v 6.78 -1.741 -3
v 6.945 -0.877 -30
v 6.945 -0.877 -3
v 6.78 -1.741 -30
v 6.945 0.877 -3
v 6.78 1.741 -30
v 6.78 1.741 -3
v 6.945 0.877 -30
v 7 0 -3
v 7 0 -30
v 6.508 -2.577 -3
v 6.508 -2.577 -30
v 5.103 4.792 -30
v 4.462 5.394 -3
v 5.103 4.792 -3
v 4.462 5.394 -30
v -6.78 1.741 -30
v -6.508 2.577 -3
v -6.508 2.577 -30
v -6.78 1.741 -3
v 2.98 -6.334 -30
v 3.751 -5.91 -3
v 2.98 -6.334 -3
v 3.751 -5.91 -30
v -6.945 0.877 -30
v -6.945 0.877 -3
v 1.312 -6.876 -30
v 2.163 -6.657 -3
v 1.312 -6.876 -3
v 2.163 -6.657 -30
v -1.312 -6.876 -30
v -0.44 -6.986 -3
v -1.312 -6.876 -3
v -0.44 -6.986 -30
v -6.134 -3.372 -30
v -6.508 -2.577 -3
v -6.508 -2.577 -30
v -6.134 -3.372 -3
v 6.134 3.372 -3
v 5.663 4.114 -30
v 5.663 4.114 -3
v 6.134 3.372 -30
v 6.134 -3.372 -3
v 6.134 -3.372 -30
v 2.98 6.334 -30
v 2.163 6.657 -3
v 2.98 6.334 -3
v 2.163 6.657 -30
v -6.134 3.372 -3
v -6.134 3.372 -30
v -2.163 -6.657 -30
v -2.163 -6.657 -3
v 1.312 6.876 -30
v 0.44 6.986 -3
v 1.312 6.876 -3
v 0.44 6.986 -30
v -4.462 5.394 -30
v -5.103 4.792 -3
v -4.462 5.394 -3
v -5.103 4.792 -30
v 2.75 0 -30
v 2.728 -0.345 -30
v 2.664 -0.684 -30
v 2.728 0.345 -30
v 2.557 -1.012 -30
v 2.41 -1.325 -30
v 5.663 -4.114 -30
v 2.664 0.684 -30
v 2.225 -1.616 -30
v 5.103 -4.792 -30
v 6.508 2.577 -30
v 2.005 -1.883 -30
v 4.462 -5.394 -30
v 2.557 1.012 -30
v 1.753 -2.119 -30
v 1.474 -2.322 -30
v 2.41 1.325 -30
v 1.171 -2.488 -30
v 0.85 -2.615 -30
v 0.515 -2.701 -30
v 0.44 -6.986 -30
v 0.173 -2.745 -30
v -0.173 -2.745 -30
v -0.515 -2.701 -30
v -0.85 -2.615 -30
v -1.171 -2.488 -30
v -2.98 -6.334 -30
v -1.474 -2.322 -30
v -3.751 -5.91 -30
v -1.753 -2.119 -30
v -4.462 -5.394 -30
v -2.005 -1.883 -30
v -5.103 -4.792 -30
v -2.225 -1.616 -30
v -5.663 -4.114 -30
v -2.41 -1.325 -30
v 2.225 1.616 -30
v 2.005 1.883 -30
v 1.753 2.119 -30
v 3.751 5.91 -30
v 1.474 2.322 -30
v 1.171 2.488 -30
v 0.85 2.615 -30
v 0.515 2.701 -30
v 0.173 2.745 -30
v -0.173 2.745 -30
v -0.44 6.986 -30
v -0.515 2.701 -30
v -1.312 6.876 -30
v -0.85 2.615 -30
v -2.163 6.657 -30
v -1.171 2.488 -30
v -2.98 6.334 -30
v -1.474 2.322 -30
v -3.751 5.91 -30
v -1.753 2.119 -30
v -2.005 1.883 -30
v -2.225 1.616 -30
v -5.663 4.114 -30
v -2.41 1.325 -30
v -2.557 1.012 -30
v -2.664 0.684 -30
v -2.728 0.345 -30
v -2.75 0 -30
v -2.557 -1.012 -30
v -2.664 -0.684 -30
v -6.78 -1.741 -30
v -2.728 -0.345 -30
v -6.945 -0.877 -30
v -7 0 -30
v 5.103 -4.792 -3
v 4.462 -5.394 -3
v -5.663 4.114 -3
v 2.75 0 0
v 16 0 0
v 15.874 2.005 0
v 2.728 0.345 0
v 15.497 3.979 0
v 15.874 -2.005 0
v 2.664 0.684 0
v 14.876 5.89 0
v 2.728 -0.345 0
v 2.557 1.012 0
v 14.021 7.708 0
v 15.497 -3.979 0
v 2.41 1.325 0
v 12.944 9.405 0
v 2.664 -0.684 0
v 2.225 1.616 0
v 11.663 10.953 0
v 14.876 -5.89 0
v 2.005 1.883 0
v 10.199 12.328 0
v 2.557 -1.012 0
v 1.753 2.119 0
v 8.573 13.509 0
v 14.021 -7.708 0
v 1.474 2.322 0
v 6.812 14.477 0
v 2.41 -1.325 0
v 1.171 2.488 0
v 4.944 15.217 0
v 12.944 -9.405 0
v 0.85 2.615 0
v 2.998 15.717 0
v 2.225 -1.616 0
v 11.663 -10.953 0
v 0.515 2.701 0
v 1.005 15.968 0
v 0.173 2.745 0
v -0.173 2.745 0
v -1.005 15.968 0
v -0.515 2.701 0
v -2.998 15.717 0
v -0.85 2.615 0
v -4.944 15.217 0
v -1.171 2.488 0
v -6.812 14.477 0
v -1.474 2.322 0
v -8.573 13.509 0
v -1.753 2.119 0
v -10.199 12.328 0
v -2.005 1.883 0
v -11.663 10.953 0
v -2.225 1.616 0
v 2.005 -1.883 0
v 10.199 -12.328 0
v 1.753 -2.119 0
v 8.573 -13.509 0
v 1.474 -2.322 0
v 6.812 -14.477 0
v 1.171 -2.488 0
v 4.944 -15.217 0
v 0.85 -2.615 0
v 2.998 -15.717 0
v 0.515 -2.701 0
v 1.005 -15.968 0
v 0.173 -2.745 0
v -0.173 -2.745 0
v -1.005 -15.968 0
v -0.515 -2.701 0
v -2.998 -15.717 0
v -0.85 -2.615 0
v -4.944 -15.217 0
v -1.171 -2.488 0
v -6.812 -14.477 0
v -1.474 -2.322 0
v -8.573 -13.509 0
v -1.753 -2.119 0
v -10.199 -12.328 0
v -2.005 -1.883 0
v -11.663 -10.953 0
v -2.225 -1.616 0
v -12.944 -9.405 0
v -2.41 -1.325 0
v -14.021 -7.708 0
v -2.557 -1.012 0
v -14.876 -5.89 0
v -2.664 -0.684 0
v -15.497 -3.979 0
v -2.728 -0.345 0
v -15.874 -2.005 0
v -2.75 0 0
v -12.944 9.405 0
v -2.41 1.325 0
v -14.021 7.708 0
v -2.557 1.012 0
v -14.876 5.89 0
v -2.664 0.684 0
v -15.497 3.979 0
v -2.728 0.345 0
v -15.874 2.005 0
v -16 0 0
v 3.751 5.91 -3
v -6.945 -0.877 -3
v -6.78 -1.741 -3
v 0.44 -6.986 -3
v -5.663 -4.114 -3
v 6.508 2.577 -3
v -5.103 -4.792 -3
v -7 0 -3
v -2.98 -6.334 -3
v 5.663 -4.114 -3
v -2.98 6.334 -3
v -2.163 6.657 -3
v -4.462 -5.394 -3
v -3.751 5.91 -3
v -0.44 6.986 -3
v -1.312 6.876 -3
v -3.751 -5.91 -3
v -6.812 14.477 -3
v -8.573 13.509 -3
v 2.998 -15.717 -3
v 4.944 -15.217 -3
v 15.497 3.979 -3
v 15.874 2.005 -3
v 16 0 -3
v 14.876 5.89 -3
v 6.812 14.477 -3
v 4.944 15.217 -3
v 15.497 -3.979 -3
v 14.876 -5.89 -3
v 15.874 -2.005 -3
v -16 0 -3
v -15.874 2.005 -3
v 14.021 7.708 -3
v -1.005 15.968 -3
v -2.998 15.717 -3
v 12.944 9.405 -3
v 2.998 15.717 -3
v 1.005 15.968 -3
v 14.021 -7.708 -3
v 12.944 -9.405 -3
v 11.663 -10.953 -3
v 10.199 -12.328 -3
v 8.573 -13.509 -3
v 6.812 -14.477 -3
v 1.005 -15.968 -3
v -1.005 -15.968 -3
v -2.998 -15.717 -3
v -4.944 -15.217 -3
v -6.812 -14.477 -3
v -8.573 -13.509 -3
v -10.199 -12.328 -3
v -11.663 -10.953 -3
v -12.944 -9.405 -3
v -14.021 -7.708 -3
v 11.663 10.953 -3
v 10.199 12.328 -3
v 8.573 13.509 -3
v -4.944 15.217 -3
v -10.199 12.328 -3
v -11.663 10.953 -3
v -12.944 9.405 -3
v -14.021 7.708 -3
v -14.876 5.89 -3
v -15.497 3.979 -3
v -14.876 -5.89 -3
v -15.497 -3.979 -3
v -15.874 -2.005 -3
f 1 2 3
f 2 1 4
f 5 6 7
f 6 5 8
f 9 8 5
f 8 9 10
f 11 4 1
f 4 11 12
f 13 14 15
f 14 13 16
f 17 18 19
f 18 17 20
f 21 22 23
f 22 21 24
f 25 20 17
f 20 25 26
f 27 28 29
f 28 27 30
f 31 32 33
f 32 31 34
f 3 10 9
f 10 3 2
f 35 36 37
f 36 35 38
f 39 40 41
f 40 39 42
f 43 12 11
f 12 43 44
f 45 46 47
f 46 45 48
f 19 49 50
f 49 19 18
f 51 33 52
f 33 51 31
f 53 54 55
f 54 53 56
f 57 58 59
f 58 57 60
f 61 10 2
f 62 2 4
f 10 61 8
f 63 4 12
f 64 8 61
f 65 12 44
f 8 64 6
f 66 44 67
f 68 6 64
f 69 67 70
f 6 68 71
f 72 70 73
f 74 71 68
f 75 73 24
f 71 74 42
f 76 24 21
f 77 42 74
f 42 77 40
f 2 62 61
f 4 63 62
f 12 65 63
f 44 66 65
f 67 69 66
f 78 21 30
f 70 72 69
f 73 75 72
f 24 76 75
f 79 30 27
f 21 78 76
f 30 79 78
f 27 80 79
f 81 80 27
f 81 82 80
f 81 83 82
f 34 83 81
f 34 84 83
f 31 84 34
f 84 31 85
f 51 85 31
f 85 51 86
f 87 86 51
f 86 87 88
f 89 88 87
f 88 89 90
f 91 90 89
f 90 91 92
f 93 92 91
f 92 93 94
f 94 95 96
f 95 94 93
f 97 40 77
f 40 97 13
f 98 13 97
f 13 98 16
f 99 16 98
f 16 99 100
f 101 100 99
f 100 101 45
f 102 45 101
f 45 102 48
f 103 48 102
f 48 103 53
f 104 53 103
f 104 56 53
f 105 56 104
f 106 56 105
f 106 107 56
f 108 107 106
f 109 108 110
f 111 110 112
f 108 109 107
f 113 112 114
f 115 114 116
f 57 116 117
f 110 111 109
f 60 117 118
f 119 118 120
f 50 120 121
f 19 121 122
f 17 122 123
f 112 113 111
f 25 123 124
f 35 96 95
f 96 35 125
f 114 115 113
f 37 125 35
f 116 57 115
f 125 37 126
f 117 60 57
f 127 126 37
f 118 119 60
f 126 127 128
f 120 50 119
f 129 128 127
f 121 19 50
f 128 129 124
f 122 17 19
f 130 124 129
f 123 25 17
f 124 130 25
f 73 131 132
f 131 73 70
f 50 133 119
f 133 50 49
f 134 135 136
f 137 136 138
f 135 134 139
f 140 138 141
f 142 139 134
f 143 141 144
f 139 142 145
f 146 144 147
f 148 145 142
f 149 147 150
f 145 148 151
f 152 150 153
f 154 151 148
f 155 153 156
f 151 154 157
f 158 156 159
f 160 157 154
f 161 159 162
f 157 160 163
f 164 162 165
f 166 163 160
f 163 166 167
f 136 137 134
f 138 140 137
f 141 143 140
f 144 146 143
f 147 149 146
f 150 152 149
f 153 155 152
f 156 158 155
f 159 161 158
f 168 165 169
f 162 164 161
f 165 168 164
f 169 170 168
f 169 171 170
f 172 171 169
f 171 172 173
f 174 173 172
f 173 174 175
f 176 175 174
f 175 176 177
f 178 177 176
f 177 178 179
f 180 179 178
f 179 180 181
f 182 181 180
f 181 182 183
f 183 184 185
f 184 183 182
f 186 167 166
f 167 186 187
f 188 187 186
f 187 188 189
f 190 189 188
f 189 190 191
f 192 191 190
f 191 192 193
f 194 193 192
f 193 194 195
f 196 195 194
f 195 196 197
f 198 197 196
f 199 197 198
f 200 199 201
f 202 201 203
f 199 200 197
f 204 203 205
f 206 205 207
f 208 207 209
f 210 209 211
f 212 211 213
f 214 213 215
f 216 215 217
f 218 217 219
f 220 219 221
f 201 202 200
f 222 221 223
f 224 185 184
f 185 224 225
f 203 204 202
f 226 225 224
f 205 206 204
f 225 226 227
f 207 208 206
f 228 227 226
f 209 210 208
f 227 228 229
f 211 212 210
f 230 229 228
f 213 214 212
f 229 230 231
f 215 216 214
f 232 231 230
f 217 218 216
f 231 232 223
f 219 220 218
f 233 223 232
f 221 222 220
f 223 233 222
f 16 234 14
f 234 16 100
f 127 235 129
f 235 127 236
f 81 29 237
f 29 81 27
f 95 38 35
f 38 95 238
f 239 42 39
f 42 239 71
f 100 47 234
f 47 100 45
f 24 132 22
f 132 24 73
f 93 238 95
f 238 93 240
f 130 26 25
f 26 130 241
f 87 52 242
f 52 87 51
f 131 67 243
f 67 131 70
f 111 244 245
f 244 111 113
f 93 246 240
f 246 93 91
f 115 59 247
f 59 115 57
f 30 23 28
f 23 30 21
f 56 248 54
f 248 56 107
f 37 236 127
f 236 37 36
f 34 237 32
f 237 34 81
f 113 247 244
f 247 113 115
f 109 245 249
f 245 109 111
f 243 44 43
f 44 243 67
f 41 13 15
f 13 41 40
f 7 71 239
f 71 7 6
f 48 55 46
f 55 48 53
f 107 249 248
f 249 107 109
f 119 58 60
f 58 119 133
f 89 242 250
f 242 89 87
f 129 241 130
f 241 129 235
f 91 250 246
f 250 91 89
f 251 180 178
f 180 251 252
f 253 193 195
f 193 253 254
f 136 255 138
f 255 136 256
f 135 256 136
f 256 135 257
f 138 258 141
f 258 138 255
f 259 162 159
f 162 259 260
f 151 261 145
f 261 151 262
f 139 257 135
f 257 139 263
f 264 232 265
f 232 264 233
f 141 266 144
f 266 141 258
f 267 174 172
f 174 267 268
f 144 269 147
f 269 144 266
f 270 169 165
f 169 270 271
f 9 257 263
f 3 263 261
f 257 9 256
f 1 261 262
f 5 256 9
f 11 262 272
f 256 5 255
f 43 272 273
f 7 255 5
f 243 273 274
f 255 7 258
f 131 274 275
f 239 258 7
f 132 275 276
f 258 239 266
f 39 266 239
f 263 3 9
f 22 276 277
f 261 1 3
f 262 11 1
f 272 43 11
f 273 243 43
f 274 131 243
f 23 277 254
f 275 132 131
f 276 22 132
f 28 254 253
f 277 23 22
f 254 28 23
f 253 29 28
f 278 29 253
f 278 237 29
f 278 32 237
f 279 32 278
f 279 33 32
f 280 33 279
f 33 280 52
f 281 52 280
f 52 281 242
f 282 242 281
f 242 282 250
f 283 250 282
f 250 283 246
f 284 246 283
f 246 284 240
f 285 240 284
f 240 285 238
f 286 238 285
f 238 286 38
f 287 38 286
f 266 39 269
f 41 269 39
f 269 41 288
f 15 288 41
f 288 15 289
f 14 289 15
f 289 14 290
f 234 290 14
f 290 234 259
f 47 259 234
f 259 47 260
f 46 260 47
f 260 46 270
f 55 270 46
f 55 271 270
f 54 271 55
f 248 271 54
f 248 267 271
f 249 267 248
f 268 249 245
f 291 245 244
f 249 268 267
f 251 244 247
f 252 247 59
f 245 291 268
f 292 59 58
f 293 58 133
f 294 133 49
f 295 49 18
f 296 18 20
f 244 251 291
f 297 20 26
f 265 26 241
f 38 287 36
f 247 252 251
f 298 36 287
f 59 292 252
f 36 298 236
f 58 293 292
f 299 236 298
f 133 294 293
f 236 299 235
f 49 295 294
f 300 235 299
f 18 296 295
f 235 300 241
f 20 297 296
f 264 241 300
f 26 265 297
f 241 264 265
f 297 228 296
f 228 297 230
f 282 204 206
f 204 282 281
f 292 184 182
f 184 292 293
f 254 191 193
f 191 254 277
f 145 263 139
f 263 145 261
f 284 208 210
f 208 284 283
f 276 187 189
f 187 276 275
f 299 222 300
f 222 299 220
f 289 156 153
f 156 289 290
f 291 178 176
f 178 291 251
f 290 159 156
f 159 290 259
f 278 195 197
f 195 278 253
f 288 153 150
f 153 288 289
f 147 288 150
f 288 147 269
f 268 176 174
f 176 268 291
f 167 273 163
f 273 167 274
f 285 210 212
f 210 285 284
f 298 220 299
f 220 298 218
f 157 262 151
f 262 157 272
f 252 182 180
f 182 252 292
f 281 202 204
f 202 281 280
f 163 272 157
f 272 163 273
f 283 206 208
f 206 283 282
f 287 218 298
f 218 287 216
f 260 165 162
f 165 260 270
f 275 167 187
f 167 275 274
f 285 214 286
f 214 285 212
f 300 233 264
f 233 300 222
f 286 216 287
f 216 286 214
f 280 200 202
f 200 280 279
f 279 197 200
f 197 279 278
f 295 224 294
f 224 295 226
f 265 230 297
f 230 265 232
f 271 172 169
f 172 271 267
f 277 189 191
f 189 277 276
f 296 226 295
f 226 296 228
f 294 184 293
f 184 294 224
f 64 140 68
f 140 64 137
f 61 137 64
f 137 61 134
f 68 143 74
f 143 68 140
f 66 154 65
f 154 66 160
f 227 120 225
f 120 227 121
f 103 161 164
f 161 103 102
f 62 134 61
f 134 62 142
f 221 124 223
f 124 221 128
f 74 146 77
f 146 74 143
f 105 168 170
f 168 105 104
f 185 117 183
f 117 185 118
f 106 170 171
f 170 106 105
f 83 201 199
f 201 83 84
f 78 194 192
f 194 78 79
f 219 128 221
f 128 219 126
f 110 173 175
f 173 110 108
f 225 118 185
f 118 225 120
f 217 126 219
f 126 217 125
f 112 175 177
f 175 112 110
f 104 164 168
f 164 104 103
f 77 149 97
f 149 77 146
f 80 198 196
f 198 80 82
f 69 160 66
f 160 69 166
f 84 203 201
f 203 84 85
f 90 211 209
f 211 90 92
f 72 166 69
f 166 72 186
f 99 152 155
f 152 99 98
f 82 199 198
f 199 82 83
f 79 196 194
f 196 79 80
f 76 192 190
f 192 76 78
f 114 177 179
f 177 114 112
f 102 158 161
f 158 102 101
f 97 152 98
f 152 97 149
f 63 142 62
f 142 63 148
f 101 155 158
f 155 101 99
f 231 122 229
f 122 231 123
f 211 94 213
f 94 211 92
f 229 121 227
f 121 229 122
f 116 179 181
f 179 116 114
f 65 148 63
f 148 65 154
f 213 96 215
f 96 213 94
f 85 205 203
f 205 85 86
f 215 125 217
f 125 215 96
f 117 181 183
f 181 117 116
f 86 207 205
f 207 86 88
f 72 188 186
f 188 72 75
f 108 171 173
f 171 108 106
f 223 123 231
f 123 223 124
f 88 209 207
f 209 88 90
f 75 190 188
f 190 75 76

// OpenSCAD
$fn = 50;


difference() {
	union() {
		translate(v = [0, 0, -30.0000000000]) {
			cylinder(h = 30, r = 7.0000000000);
		}
		translate(v = [0, 0, -3.0000000000]) {
			cylinder(h = 3, r = 16.0000000000);
		}
	}
	union() {
		#translate(v = [0, 0, -30]) {
			cylinder(h = 30, r = 2.7500000000);
		}
	}
}
